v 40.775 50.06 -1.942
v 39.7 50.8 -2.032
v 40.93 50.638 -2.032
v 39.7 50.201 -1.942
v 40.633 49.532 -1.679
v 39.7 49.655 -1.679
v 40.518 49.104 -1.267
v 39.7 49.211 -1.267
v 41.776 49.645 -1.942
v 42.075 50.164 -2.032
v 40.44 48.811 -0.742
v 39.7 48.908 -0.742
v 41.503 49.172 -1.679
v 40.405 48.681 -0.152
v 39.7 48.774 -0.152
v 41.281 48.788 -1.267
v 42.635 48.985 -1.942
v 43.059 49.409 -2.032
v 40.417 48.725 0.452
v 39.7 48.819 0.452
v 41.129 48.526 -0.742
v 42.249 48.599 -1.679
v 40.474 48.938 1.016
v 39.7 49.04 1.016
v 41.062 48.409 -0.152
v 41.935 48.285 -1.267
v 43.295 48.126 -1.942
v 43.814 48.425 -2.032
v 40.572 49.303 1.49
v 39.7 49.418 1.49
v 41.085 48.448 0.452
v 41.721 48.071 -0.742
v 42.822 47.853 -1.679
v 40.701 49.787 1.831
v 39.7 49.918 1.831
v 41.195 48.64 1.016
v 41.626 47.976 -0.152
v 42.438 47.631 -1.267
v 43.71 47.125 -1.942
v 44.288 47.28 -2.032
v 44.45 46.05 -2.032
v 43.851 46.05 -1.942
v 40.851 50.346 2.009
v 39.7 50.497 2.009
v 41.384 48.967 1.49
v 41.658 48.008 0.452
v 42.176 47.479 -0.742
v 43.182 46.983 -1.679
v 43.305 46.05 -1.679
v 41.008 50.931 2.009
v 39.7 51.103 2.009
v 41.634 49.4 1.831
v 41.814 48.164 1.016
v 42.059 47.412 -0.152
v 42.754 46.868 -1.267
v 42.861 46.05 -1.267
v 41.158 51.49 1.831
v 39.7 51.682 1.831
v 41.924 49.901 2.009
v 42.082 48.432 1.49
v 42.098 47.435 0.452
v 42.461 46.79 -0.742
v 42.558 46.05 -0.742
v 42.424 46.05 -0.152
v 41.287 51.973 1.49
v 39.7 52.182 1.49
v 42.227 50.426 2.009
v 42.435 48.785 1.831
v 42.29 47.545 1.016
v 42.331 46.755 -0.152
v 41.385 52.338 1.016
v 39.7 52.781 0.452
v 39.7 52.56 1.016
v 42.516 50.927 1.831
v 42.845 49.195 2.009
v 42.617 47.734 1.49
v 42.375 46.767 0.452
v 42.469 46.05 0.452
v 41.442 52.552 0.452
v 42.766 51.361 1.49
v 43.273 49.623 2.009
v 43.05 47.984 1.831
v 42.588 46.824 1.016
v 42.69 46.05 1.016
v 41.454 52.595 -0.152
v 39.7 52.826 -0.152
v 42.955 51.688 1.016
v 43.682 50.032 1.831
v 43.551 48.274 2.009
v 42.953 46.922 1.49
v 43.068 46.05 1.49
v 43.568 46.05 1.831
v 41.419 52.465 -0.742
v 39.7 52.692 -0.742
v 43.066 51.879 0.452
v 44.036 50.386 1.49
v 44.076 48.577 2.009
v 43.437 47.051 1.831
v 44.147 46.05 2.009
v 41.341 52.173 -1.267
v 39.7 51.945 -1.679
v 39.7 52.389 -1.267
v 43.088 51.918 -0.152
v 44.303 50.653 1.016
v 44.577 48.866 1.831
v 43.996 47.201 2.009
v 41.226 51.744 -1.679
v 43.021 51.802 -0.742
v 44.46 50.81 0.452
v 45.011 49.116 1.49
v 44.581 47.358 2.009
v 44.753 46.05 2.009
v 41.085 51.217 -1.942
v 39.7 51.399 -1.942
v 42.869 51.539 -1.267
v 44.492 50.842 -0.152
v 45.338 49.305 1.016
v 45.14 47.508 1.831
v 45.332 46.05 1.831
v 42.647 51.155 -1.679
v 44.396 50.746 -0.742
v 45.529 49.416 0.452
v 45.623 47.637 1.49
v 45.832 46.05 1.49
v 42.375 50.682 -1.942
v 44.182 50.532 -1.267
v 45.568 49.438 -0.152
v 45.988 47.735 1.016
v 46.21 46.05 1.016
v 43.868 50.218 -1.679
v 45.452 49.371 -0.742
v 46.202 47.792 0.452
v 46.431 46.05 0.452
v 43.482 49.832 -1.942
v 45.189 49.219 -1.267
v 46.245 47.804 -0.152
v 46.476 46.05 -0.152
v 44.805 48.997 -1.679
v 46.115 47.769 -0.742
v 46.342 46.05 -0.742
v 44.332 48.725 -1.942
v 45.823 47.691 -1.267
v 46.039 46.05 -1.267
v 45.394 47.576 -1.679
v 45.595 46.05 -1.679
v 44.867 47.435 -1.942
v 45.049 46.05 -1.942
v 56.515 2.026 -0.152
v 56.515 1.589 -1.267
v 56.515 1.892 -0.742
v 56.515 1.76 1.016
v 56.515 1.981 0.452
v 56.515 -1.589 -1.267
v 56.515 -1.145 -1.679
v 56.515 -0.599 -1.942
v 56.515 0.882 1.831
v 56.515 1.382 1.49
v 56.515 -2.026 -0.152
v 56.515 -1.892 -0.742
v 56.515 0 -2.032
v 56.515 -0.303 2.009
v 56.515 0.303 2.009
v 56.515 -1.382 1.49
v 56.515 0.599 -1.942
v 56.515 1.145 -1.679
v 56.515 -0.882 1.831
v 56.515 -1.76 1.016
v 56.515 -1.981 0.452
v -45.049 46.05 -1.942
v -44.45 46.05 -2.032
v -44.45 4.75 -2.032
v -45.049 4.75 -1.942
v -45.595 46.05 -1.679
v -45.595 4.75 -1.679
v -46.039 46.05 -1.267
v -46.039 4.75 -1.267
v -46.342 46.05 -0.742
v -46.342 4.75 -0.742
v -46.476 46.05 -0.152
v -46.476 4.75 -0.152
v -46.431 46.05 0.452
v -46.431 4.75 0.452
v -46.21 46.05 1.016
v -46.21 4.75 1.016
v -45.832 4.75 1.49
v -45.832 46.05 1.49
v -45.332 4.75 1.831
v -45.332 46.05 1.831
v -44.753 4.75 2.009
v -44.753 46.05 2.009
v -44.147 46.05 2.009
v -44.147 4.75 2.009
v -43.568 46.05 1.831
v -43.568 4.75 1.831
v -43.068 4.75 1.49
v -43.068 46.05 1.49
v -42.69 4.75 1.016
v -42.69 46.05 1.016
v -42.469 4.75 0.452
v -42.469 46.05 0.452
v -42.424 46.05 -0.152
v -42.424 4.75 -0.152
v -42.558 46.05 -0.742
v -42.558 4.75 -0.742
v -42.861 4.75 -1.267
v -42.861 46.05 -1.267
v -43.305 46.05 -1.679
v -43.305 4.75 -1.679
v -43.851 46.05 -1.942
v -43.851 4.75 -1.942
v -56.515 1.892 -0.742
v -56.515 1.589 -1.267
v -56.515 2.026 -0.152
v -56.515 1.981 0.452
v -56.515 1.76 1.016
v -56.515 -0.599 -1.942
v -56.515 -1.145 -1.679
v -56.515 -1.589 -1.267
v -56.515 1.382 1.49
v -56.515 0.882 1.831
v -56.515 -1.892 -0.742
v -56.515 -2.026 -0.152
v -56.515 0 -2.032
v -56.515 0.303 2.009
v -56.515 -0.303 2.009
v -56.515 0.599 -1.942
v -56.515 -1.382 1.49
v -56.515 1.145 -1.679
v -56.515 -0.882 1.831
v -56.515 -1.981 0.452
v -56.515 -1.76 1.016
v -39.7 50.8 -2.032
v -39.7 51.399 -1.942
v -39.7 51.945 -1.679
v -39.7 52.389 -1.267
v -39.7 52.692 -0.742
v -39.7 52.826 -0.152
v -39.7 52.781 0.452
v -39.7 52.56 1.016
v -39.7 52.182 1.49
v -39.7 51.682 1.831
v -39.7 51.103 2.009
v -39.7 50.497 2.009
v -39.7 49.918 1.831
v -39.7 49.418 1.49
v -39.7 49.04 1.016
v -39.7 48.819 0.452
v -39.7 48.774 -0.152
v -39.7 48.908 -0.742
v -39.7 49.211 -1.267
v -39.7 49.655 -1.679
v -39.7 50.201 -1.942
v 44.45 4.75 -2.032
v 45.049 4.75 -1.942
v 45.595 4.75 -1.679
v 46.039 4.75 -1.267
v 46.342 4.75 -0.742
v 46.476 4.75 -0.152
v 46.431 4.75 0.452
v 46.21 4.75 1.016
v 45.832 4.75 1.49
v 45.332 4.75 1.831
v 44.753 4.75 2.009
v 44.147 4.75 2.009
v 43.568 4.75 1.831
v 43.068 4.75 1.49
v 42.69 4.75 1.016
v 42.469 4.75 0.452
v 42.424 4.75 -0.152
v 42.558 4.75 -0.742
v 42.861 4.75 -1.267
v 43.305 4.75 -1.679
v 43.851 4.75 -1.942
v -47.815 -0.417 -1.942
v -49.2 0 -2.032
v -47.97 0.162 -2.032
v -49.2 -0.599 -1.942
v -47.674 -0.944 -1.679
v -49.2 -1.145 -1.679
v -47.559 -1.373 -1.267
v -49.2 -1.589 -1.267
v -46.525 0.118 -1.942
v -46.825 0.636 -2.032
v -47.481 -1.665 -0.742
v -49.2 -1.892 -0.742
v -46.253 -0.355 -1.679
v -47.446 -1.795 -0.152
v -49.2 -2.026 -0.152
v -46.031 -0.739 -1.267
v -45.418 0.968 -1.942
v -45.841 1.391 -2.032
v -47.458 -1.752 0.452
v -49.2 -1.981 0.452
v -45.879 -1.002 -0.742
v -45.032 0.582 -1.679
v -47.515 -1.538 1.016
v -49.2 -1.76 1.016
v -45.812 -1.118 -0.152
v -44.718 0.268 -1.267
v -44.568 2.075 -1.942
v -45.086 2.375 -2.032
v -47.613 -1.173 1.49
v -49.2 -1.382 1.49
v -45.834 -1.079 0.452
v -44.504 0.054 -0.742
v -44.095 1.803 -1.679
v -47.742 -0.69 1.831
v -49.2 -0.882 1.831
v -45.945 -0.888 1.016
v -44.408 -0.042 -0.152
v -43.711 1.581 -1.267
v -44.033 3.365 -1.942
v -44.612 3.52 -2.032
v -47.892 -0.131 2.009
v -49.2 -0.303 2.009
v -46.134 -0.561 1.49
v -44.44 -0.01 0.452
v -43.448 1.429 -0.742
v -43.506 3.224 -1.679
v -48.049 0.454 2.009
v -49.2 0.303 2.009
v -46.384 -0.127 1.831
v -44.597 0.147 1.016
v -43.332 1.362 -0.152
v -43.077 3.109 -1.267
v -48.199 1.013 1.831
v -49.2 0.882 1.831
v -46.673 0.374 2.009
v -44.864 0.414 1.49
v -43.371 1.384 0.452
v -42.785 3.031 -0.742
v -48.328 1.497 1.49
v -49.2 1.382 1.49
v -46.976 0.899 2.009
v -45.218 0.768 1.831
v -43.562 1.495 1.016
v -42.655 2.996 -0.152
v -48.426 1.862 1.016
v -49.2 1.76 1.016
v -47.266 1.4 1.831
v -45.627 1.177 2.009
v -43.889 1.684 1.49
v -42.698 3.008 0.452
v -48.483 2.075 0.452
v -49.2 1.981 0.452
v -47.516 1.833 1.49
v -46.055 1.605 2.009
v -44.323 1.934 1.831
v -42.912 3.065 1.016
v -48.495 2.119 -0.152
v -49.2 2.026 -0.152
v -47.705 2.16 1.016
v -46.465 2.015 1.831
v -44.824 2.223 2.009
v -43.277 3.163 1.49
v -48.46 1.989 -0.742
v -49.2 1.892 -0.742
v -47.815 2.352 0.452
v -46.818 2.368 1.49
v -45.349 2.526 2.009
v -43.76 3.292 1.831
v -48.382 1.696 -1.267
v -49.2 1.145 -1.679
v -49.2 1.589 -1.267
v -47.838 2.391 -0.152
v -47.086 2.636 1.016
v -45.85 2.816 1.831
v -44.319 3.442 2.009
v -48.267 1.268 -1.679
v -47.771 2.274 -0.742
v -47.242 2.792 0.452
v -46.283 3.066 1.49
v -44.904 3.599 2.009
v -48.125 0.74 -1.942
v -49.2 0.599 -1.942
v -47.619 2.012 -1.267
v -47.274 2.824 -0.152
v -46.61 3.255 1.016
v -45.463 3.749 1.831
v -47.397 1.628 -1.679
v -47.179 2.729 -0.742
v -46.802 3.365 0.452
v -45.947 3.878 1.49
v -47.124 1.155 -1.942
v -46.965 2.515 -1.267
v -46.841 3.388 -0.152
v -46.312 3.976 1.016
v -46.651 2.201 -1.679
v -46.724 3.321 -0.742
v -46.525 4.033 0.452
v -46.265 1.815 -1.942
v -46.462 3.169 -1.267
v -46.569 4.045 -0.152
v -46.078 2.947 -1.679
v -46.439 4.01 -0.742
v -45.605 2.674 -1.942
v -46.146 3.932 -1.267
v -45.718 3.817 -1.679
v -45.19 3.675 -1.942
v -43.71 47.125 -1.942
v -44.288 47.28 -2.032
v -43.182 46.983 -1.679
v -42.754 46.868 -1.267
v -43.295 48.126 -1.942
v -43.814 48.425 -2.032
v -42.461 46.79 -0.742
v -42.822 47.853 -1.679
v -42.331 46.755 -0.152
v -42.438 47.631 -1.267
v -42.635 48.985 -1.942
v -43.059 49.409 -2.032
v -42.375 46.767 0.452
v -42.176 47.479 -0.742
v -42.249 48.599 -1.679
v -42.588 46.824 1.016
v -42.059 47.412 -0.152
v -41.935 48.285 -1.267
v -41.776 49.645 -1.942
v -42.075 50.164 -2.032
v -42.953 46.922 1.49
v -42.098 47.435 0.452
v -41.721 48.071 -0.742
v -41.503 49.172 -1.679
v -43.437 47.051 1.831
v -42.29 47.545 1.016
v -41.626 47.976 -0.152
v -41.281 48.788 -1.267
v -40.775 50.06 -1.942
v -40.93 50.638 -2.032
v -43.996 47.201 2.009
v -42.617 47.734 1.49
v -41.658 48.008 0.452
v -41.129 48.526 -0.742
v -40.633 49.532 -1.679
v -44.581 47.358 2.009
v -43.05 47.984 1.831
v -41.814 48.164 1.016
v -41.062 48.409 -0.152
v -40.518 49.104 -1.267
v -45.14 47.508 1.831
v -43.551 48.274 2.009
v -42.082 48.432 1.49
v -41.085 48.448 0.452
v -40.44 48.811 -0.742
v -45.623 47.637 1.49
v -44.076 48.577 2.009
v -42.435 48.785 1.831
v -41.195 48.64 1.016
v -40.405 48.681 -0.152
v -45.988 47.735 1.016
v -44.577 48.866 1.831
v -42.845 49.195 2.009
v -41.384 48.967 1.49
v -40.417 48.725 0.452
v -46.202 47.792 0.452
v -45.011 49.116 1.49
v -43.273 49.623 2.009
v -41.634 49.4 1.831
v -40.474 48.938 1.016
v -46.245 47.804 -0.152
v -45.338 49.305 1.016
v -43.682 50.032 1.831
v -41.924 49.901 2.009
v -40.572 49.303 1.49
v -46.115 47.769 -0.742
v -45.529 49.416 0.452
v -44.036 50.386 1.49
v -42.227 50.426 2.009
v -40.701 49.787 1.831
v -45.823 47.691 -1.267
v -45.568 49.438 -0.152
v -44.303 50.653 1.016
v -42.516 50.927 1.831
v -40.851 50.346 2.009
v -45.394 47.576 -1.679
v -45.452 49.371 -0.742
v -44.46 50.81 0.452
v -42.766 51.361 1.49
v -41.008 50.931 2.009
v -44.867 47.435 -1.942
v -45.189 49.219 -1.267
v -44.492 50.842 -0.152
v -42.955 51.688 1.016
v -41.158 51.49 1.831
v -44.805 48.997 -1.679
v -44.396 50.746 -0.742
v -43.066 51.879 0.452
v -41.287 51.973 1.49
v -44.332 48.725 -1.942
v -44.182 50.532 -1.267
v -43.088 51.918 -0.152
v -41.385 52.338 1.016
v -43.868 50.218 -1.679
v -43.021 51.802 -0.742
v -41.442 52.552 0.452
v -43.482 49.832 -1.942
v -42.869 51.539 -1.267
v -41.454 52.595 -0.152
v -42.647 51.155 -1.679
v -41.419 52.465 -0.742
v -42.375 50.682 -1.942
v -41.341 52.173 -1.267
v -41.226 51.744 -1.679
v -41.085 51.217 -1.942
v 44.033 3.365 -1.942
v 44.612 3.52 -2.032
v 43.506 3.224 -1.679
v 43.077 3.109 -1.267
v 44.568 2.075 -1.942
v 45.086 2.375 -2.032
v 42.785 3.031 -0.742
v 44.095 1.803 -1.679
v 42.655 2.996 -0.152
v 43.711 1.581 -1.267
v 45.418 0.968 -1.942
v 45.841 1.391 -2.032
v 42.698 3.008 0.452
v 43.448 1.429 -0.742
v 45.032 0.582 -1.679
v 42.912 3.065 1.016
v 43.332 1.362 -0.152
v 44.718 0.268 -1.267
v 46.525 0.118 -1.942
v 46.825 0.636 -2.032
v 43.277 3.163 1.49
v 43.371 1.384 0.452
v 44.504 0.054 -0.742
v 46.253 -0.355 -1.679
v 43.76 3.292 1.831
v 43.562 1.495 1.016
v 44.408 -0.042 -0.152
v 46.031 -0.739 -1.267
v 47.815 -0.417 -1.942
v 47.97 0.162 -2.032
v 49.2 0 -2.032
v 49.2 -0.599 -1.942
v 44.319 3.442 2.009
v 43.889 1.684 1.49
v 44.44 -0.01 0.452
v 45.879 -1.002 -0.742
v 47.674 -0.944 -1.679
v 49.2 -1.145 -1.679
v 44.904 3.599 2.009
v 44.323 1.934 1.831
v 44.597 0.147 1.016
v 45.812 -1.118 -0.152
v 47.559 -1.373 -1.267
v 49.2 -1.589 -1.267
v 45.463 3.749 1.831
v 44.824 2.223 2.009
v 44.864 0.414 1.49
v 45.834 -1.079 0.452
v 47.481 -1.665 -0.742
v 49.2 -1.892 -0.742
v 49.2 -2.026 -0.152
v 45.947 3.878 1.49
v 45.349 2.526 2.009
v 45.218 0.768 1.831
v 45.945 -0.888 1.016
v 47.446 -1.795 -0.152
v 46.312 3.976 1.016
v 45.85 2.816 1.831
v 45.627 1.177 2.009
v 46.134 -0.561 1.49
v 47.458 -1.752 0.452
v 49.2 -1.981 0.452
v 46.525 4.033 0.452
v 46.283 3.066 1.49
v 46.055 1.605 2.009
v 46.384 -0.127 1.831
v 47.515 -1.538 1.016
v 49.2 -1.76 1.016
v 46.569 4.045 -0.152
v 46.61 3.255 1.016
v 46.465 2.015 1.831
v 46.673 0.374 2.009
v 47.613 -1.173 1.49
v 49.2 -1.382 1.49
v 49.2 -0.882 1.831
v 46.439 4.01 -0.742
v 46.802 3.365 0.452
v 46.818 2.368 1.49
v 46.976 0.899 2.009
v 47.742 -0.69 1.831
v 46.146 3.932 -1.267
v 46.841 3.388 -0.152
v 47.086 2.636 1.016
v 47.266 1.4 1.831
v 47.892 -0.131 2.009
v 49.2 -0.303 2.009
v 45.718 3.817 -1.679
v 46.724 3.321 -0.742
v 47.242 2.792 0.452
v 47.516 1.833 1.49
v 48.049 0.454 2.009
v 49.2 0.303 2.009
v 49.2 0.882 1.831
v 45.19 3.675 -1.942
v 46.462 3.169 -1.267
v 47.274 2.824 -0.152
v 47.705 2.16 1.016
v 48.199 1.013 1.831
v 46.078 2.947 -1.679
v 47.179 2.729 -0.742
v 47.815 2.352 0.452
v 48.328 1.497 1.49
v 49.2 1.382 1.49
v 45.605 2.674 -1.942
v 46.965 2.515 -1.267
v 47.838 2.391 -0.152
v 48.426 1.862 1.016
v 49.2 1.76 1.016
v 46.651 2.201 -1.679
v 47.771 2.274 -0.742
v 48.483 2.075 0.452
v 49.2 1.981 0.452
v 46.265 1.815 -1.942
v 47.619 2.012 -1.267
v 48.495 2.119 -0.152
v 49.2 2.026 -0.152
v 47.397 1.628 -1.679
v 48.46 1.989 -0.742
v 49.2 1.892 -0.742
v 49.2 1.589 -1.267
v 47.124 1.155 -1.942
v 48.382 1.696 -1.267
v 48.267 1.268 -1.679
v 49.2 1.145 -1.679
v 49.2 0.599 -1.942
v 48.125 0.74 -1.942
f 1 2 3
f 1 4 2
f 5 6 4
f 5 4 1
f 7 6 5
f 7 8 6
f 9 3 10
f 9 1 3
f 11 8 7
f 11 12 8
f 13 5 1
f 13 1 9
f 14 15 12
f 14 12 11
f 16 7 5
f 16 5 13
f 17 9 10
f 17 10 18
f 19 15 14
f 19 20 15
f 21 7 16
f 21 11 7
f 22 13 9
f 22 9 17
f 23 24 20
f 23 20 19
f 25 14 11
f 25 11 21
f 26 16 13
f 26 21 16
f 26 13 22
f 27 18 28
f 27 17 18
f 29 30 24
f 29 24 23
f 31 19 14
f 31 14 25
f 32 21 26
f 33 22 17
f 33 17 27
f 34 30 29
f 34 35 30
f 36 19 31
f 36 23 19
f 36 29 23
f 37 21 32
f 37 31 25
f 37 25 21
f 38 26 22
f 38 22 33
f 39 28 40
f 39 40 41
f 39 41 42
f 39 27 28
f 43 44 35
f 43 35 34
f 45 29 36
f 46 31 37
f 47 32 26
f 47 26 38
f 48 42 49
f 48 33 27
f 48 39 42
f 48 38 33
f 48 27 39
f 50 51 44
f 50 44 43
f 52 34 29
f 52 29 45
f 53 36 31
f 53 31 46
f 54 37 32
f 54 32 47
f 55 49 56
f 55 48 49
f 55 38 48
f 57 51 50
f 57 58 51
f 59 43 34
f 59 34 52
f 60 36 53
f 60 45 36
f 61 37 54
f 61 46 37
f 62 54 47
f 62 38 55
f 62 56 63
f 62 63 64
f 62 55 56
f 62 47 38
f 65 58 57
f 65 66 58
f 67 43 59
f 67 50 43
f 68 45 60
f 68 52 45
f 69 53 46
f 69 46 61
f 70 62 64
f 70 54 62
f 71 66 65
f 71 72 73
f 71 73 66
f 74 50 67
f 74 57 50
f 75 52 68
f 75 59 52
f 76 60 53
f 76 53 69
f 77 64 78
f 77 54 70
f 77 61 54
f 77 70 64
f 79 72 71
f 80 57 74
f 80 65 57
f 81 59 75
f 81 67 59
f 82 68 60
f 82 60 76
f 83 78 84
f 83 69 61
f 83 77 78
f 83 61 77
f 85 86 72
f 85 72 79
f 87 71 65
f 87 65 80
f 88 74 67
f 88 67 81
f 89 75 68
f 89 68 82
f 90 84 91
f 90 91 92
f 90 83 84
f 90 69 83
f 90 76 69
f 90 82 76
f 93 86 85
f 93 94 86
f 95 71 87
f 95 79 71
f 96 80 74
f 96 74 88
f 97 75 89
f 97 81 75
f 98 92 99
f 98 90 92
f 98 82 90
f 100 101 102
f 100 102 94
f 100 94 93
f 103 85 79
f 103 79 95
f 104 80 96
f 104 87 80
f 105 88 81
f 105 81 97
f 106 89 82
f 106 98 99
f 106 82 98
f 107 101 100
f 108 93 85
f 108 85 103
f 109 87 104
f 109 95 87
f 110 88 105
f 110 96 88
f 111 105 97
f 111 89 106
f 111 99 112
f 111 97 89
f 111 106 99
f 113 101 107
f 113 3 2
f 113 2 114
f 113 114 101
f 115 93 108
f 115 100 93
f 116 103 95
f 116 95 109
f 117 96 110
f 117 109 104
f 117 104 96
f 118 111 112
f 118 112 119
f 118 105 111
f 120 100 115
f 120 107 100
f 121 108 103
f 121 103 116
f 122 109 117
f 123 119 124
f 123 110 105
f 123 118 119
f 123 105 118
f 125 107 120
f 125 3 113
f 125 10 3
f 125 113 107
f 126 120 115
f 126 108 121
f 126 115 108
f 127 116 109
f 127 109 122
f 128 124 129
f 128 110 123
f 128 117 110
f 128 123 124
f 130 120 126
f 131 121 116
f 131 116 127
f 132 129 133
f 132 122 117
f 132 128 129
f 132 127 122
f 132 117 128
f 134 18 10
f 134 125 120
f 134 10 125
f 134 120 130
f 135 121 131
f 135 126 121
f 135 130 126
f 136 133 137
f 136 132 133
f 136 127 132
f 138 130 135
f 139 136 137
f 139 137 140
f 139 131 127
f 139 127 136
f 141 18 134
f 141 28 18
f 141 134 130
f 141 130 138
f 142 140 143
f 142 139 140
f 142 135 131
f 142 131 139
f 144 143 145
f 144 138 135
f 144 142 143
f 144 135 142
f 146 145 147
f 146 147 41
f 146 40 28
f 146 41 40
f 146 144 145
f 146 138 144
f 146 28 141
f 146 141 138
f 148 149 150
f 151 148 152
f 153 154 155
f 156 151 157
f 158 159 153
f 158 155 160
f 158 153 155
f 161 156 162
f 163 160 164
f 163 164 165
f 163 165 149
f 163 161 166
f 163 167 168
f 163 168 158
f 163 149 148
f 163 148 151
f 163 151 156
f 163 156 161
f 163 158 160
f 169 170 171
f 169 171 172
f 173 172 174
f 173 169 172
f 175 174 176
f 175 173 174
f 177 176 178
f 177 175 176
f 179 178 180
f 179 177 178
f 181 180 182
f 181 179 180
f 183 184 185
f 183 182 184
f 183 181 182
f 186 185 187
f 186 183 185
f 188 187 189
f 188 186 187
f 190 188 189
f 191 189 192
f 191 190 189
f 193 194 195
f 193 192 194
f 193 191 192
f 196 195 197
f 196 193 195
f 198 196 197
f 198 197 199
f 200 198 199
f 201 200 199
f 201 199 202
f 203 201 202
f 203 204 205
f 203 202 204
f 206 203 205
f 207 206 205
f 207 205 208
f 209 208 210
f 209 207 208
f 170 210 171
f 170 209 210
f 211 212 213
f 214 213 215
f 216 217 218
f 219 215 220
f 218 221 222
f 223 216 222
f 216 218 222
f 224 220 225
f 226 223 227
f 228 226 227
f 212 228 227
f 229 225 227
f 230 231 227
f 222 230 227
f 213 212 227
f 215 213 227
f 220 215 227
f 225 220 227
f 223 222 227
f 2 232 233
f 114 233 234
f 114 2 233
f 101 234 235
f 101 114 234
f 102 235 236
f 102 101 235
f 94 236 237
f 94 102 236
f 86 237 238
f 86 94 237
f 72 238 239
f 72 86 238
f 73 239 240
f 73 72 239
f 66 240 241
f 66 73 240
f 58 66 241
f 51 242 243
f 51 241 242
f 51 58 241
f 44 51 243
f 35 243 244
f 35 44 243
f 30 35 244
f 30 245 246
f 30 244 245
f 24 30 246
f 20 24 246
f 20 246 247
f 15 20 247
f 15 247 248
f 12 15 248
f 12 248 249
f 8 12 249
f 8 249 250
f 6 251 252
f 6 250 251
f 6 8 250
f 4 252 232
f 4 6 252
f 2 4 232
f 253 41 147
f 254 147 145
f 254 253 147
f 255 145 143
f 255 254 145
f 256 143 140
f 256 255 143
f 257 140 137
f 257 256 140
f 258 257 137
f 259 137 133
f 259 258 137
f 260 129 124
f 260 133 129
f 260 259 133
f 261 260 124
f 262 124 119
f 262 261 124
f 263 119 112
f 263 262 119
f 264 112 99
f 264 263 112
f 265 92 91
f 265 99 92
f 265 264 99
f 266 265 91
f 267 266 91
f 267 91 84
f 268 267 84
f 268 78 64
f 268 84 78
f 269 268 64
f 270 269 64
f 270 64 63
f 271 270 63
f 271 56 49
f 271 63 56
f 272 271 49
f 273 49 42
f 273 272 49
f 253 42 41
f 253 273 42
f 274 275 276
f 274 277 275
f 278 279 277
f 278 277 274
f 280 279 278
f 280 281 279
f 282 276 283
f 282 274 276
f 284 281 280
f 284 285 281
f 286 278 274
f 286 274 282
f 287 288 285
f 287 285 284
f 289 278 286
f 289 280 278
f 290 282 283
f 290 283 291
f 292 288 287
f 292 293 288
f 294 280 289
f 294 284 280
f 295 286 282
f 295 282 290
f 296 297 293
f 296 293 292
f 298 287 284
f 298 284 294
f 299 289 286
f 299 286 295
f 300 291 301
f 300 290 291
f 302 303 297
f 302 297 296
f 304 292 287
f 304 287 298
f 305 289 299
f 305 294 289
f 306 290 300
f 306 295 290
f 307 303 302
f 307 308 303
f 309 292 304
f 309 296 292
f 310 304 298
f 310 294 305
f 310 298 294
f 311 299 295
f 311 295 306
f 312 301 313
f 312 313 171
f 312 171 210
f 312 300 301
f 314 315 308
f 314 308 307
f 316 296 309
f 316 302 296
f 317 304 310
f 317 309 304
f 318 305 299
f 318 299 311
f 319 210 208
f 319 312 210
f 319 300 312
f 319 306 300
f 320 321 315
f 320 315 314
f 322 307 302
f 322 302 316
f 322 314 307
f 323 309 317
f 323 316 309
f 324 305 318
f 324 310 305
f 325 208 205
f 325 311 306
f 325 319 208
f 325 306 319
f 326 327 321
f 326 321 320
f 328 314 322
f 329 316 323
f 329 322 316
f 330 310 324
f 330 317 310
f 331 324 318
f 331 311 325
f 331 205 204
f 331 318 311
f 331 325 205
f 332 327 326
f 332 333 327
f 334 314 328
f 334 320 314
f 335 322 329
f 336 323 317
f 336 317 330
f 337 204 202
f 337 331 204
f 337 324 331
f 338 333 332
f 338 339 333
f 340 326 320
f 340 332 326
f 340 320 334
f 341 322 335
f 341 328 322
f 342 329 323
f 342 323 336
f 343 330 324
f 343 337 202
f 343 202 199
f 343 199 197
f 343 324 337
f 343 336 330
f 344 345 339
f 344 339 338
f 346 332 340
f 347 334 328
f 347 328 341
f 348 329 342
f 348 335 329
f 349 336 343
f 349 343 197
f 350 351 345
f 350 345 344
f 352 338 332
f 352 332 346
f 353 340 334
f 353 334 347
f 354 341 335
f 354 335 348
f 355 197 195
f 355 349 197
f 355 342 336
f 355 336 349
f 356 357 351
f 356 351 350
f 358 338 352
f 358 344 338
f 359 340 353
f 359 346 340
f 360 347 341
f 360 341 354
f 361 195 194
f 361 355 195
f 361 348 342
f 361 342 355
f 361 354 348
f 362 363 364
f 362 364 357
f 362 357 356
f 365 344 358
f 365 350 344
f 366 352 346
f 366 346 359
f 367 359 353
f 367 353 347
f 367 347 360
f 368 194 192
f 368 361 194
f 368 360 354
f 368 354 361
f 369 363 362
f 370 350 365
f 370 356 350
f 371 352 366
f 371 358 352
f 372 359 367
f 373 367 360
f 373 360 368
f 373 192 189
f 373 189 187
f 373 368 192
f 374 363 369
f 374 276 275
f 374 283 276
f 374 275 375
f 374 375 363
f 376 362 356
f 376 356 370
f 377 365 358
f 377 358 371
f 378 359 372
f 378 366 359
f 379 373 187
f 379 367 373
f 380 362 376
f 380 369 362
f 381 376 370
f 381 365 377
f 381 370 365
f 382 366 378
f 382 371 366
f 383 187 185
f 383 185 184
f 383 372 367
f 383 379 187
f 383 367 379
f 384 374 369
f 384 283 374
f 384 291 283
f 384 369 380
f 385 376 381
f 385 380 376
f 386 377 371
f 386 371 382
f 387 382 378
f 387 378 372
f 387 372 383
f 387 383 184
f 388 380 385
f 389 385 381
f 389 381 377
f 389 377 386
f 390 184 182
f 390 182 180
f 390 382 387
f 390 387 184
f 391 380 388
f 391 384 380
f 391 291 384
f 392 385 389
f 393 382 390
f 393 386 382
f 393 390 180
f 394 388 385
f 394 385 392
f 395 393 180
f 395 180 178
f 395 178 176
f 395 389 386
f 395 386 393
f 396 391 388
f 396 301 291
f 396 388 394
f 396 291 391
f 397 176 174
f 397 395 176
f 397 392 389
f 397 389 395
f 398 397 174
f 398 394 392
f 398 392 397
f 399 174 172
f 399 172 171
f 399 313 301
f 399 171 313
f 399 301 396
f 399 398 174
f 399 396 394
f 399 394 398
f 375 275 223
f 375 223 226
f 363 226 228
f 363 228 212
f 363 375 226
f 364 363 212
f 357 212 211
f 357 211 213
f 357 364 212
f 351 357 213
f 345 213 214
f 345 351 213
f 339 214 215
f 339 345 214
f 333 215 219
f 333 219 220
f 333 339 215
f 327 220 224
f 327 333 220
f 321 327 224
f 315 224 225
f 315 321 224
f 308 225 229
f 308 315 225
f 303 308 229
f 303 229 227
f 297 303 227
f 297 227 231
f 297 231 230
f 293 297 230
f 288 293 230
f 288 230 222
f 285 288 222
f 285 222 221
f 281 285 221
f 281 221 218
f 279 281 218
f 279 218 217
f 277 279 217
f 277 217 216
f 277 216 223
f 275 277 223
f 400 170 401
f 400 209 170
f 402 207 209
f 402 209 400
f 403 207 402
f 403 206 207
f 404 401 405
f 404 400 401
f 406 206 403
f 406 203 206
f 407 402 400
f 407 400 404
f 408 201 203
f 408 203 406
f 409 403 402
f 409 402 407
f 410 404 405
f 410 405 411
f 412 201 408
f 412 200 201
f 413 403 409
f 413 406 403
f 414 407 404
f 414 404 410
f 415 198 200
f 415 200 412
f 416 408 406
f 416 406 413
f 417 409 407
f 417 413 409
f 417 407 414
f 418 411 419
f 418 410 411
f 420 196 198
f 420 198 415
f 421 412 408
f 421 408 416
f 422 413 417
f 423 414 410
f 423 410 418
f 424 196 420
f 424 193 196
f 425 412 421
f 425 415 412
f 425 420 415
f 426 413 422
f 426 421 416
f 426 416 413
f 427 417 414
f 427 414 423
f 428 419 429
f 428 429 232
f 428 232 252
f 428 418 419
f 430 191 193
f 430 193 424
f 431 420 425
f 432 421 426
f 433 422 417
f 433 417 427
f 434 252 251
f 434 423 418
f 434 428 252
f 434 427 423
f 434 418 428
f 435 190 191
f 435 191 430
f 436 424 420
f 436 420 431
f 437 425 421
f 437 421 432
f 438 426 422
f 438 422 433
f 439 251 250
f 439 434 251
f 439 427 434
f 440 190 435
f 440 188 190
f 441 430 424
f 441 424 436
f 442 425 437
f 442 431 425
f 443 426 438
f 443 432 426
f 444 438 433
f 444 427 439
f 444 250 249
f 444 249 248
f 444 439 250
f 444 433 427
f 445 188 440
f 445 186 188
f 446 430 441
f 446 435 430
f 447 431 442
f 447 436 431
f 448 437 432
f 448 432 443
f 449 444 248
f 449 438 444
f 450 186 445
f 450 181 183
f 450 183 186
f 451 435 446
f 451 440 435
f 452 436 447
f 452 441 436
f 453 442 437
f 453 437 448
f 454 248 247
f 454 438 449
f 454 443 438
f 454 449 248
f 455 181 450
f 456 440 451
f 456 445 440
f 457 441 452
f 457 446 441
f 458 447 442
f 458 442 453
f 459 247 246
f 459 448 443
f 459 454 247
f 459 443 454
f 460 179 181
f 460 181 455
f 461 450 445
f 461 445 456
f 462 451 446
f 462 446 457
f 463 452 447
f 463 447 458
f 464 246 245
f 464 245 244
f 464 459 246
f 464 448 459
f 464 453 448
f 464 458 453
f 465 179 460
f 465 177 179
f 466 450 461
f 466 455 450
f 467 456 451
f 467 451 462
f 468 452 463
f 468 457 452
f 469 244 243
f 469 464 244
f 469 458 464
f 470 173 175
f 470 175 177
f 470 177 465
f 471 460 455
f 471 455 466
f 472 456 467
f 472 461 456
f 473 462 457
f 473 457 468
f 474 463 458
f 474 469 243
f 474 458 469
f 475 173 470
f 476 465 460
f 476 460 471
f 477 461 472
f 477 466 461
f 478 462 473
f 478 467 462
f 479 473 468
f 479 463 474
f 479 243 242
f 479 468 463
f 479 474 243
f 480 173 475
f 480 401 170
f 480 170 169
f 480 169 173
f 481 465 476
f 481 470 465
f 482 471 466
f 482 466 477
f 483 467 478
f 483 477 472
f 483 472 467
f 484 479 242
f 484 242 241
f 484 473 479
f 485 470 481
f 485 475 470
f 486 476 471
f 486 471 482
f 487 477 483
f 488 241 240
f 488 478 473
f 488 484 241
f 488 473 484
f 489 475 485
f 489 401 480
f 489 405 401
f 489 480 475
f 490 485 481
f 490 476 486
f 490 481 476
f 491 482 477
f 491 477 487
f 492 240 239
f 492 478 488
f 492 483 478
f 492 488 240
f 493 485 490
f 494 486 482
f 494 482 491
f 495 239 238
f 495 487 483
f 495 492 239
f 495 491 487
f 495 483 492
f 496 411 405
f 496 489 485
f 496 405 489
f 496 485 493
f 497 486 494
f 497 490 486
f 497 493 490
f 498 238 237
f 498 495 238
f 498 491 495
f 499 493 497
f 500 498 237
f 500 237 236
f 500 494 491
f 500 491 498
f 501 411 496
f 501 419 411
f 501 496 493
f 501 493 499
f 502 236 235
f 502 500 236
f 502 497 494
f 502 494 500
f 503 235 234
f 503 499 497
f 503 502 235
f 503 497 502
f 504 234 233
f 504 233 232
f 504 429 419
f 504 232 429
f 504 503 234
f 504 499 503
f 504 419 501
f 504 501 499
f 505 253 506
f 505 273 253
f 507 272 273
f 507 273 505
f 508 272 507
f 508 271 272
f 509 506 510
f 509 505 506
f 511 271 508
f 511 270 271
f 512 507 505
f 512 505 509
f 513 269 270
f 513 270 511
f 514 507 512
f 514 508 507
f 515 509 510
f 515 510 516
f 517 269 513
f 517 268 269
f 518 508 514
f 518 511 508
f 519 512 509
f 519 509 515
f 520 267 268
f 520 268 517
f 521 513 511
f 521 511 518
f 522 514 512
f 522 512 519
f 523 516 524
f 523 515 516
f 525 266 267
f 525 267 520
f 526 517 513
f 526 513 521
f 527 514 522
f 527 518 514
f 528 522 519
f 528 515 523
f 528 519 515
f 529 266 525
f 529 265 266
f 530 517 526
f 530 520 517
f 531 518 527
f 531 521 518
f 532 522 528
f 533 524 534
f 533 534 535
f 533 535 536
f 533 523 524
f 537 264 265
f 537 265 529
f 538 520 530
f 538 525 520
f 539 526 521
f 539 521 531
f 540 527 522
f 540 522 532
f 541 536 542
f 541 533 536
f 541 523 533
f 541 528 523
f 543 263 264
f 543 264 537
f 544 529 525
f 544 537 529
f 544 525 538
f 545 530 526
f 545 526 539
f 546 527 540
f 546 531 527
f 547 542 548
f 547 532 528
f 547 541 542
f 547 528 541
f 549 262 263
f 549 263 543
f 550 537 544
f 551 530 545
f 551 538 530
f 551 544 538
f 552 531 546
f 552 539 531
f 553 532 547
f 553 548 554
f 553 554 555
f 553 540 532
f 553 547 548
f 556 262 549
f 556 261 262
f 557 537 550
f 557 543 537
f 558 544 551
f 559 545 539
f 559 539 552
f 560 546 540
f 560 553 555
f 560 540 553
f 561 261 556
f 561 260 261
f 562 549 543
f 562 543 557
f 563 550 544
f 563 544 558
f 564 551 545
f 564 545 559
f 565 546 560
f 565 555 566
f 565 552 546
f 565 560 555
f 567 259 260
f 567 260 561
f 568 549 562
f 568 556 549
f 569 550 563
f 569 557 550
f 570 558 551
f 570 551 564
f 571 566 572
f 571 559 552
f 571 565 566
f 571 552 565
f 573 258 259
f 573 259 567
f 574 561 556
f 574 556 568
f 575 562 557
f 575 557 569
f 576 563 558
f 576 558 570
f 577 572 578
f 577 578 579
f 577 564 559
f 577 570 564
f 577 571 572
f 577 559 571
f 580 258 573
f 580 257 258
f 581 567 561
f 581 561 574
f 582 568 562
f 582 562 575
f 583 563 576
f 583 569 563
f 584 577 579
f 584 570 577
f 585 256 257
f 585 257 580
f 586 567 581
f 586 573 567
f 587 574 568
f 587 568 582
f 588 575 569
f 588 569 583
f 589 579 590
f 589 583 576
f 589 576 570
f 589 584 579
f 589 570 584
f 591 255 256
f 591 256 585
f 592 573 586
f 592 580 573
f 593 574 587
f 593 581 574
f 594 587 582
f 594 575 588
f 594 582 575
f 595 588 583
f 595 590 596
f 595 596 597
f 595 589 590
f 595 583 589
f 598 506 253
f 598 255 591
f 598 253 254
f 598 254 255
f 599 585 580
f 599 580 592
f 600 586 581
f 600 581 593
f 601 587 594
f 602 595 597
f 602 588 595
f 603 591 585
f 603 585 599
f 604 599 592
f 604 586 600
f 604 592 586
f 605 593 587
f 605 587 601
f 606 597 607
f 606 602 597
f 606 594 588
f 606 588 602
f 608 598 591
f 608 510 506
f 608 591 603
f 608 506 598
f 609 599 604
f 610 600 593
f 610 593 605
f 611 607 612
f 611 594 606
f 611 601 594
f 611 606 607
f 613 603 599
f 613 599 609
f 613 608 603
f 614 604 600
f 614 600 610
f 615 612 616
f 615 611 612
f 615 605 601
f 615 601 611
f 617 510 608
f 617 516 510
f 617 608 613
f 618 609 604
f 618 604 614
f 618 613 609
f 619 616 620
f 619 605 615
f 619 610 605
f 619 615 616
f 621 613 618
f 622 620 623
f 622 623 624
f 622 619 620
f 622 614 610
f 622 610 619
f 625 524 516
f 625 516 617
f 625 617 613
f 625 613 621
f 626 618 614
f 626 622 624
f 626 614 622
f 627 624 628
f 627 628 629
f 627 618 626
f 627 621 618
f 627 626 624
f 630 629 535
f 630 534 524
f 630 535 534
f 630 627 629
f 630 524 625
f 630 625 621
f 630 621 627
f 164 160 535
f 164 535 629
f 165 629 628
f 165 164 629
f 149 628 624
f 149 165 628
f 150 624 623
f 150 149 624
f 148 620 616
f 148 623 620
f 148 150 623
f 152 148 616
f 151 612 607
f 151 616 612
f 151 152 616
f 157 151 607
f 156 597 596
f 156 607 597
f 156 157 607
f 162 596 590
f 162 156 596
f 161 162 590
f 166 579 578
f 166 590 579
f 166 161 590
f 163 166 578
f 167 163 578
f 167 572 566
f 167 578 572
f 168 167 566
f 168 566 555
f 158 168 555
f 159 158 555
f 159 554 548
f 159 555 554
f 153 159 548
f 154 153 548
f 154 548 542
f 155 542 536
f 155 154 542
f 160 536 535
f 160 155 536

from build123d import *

# Parameters (mm, degrees)
SKETCH2_R = 2.032


with BuildPart() as part:
    # Base-Sweep: sweep along a path in Sketch1
    with BuildLine(Plane.XY) as base_sweep_path:
        Line((-56.515, 0), (-49.1998, 0))
        ThreePointArc((-49.1998, 0), (-45.841184211, 1.391184211), (-44.45, 4.7498))
        Line((-44.45, 4.7498), (-44.45, 46.0502))
        ThreePointArc((-44.45, 46.0502), (-43.058815789, 49.408815789), (-39.7002, 50.8))
        Line((-39.7002, 50.8), (39.7002, 50.8))
        ThreePointArc((39.7002, 50.8), (43.058815789, 49.408815789), (44.45, 46.0502))
        Line((44.45, 46.0502), (44.45, 4.7498))
        ThreePointArc((44.45, 4.7498), (45.841184211, 1.391184211), (49.1998, 0))
        Line((49.1998, 0), (56.515, 0))
    # Sketch2 → Base-Sweep (sweep)
    with BuildSketch(Plane(origin=(56.515, 0, 0), x_dir=(0, 0, -1), z_dir=(1, 0, 0))):
        Circle(SKETCH2_R)
    sweep(path=base_sweep_path.line)


solid = part.part
